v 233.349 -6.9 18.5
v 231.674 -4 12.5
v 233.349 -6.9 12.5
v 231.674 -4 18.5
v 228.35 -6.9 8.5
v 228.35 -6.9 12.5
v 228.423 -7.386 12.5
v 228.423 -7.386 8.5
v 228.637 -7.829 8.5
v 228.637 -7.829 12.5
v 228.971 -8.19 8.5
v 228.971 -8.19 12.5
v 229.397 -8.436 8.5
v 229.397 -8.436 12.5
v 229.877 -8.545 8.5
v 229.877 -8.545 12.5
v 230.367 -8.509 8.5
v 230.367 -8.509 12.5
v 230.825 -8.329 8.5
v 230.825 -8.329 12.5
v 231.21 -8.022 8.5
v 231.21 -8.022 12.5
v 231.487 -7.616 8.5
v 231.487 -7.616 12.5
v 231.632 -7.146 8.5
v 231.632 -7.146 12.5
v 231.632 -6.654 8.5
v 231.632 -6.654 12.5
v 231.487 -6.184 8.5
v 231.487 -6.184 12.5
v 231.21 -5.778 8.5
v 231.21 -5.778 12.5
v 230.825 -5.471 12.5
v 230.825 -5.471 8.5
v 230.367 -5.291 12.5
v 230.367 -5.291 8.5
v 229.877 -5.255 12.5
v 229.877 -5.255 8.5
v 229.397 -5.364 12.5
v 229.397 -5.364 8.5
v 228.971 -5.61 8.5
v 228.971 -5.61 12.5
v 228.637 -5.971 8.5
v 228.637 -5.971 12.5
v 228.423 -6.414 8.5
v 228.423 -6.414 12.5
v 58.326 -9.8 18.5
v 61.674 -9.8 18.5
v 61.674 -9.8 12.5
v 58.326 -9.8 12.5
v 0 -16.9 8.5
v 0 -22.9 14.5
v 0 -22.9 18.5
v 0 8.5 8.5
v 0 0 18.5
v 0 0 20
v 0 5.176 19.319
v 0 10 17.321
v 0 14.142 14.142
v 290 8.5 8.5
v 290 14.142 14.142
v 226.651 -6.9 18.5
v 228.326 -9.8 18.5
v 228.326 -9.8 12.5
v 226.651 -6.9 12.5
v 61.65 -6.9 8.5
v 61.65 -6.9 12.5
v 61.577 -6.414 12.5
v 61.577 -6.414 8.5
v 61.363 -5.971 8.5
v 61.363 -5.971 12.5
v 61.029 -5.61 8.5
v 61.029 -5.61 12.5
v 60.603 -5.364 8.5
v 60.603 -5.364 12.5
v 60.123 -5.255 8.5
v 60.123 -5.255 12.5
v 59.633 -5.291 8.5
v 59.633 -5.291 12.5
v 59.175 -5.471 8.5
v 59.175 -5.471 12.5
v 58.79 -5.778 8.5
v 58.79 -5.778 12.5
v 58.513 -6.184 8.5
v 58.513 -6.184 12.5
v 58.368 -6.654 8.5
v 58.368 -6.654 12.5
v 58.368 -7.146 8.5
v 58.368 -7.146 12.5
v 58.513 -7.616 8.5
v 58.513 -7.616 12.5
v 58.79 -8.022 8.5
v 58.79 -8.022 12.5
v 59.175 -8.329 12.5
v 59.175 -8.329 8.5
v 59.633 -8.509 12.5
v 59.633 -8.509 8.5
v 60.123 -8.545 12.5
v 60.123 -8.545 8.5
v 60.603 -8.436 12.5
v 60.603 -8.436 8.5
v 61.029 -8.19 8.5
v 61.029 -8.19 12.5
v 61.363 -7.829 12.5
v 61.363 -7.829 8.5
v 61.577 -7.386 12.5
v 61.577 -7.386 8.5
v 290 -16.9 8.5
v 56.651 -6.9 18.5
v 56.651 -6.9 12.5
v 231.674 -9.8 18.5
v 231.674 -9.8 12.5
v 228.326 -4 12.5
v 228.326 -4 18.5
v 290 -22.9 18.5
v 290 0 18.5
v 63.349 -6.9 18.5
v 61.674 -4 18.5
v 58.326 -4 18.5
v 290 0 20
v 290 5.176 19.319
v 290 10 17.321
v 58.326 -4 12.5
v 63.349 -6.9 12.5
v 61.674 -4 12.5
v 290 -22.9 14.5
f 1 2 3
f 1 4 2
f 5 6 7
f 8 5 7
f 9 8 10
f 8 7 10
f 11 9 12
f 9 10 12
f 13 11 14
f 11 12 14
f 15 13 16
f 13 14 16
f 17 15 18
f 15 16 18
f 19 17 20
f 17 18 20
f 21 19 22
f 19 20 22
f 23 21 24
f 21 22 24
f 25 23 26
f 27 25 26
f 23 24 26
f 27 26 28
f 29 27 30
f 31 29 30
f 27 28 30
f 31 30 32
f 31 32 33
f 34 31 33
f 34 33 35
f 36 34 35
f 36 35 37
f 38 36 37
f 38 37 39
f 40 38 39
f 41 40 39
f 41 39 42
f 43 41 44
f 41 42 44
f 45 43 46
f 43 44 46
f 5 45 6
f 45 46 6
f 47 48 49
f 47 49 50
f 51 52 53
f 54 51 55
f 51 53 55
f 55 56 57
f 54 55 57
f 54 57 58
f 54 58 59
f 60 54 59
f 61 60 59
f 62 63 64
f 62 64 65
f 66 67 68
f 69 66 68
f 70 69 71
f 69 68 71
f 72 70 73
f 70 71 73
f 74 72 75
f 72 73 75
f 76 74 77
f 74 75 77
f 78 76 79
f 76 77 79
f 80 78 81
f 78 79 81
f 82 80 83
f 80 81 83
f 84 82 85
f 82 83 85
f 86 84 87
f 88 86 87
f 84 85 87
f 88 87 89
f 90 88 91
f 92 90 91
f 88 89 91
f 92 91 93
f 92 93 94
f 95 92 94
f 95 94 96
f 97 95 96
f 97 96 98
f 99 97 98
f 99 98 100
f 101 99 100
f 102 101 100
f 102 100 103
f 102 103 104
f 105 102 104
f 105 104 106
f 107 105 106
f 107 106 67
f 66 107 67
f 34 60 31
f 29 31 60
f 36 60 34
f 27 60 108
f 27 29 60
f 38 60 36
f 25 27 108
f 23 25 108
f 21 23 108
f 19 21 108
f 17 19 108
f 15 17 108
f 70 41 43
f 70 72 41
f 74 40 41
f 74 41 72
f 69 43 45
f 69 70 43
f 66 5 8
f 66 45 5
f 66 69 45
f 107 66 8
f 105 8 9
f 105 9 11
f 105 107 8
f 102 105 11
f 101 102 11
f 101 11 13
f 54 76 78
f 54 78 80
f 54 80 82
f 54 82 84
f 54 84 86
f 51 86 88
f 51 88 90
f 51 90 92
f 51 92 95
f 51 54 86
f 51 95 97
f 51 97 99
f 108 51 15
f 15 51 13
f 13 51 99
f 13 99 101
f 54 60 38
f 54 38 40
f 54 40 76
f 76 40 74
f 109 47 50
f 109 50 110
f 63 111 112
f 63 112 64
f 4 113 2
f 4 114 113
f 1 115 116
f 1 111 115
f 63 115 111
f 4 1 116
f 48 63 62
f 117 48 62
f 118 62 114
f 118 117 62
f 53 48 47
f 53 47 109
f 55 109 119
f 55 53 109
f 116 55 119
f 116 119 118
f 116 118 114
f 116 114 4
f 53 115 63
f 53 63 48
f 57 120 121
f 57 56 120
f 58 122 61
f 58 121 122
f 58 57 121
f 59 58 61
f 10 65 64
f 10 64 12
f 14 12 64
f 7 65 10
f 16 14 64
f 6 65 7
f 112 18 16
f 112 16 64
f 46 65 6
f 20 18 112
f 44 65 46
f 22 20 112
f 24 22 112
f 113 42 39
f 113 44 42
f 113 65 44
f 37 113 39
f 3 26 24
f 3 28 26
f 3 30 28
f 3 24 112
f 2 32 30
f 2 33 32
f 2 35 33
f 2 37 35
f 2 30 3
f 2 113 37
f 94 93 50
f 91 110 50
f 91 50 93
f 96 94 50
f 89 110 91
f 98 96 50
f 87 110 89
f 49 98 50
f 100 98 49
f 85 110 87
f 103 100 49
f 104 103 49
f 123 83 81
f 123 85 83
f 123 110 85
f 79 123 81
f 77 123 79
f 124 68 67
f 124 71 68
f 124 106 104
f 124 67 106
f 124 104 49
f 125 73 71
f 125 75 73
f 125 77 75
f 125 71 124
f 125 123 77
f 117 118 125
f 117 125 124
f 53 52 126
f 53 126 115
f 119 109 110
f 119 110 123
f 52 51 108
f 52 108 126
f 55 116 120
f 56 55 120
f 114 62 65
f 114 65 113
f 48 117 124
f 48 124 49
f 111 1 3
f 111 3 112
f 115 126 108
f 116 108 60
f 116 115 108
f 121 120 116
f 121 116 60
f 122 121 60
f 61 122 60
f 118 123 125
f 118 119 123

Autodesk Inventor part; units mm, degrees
ref_plane "YZ Plane" through (0, 0, 0) normal (1, 0, 0) x (0, 1, 0)
ref_plane "XZ Plane" through (0, 0, 0) normal (0, 1, 0) x (-1, 0, 0)
ref_plane "XY Plane" through (0, 0, 0) normal (0, 0, 1) x (1, 0, 0)
sketch "Sketch1" plane through (0, 0, 0) normal (1, 0, 0) x (0, 1, 0)
  circle A0 centre (0, 0) radius 20
  line L0 (8.5, 8.5) -> (-16.9, 8.5)
  line L1 (8.5, 8.5) -> (8.5, -16.9)
  line L2 (0, 0) -> (0, 20)
  line L3 (0, 20) -> (-60.9241, 20)
  line L4 (-60.9241, 20) -> (-60.9241, 18.5)
  line L5 (-60.9241, 18.5) -> (0, 18.5)
  line L6 (0, 18.5) -> (0, 20)
  line L7 (0, 0) -> (14.1421, 14.1421)
  line L8 (0, 0) -> (20, 0)
  line L9 (-16.9, 8.5) -> (-16.9, 18.5)
  line L10 (-16.9, 8.5) -> (-22.9, 14.5)
  line L11 (-22.9, 14.5) -> (-22.9, 18.5)
  line L12 (12.3744, 12.3744) -> (12.1502, 13.2109)
  line L13 (11.3137, 13.435) -> (9.2071, 11.3284)
  line L14 (9.4313, 10.4919) -> (10.2678, 10.2678)
  line L15 (8.5, 8.5) -> (8.5, -16.9)
  line L16 (20, 0) -> (20, -60.9241)
  line L17 (20, -60.9241) -> (18.5, -60.9241)
  line L18 (18.5, -60.9241) -> (18.5, 0)
  line L19 (8.5, -16.9) -> (18.5, -16.9)
  line L20 (8.5, -16.9) -> (14.5, -22.9)
  line L21 (14.5, -22.9) -> (18.5, -22.9)
  arc A1 (9.2071, 11.3284) -> (9.4313, 10.4919) centre (9.5607, 10.9749) ccw
  arc A2 (12.1502, 13.2109) -> (11.3137, 13.435) centre (11.6673, 13.0815) ccw
  line L22 (10.4311, 10.4311) -> (9.483, 10.6851)
  arc A3 (9.3485, 11.187) -> (9.483, 10.6851) centre (9.5607, 10.9749) ccw
  line L23 (9.3485, 11.187) -> (11.4551, 13.2936)
  arc A4 (11.957, 13.1591) -> (11.4551, 13.2936) centre (11.6673, 13.0815) ccw
  line L24 (11.957, 13.1591) -> (12.2111, 12.2111)
  point P0 (0, 8.5)
  point P1 (-17.7041, 9.3041)
  point P2 (-16.9, 10.6953)
  dimension "d0" = 40
  dimension "d1" = 25.4
  dimension "d2" = 1.5
  dimension "d4" = 45
  dimension "d6" = 45
  dimension "d7" = 4
  dimension "d8" = 10
  dimension "d10" = 2.5
  dimension "d11" = 2.5
  dimension "d12" = 60
  dimension "d13" = 1.5
  dimension "d15" = 0.5
  dimension "d16" = 0.2
extrude "Extrusion1" add sketch "Sketch1" along normal blind 290 contours L7 L12 A2 L13 A1 L14 L0 L2 A0 | L7 L24 A4 L23 A3 L22 L14 A1 L13 A2 L12 | L5 L2 L0 L9 A0 | A0 L9 L5 | L7 L22 A3 L23 A4 L24 | L9 L10 A0 | A0 L10 L11 L5 L9
sketch "Sketch2" plane through (0, -22.9, 18.5) normal (0, 0, 1) x (1, 0, 0)
  line L0 (0, 22.9) -> (0, 0) projected
  line L1 (0, 0) -> (290, 0) projected
  line L2 (290, 22.9) -> (290, 0) projected
  line L3 (0, 22.9) -> (290, 22.9) projected
  line L4 (58.3257, 13.1) -> (56.6514, 16)
  line L5 (56.6514, 16) -> (58.3257, 18.9)
  line L6 (58.3257, 18.9) -> (61.6743, 18.9)
  line L7 (61.6743, 18.9) -> (63.3486, 16)
  line L8 (63.3486, 16) -> (61.6743, 13.1)
  line L9 (61.6743, 13.1) -> (58.3257, 13.1)
  line L10 (0, 6) -> (290, 6) projected
  circle A0 centre (60, 16) radius 1.65
  dimension "d20" = 10
  dimension "d21" = 5.8
  dimension "d22" = 60
  dimension "d25" = 3.3
extrude "Extrusion2" cut sketch "Sketch2" against normal blind 6 contours L4 L5 L6 L7 L8 L9 | A0
extrude "Extrusion3" cut sketch "Sketch2" against normal through all contours A0
sketch "Sketch3" plane through (0, -22.9, 18.5) normal (0, 0, 1) x (1, 0, 0)
  line L0 (0, 37.0421) -> (290, 37.0421) projected
  line L1 (0, 0) -> (290, 0) projected
  line L2 (0, 22.9) -> (0, 0) projected
  line L3 (0, 22.9) -> (0, 37.0421) projected
  line L4 (2.4384, 37.0421) -> (17.8575, 0)
  line L5 (0, 0) -> (290, 0) projected
  line L6 (2.4384, 37.0421) -> (0, 42.9) projected
  point P0 (0, 26.9698)
  dimension "d28" = 112.6
ref_plane "Work Plane1" through (145, 0, 0) normal (-1, 0, 0) x (0, 0, 1)
mirror "Mirror1" about plane through (145, 0, 0) normal (-1, 0, 0) of "Extrusion2", "Extrusion3"
properties part number "ESQUINA_REDONDEADA_R20" material "Steel, Mild, Welded"
